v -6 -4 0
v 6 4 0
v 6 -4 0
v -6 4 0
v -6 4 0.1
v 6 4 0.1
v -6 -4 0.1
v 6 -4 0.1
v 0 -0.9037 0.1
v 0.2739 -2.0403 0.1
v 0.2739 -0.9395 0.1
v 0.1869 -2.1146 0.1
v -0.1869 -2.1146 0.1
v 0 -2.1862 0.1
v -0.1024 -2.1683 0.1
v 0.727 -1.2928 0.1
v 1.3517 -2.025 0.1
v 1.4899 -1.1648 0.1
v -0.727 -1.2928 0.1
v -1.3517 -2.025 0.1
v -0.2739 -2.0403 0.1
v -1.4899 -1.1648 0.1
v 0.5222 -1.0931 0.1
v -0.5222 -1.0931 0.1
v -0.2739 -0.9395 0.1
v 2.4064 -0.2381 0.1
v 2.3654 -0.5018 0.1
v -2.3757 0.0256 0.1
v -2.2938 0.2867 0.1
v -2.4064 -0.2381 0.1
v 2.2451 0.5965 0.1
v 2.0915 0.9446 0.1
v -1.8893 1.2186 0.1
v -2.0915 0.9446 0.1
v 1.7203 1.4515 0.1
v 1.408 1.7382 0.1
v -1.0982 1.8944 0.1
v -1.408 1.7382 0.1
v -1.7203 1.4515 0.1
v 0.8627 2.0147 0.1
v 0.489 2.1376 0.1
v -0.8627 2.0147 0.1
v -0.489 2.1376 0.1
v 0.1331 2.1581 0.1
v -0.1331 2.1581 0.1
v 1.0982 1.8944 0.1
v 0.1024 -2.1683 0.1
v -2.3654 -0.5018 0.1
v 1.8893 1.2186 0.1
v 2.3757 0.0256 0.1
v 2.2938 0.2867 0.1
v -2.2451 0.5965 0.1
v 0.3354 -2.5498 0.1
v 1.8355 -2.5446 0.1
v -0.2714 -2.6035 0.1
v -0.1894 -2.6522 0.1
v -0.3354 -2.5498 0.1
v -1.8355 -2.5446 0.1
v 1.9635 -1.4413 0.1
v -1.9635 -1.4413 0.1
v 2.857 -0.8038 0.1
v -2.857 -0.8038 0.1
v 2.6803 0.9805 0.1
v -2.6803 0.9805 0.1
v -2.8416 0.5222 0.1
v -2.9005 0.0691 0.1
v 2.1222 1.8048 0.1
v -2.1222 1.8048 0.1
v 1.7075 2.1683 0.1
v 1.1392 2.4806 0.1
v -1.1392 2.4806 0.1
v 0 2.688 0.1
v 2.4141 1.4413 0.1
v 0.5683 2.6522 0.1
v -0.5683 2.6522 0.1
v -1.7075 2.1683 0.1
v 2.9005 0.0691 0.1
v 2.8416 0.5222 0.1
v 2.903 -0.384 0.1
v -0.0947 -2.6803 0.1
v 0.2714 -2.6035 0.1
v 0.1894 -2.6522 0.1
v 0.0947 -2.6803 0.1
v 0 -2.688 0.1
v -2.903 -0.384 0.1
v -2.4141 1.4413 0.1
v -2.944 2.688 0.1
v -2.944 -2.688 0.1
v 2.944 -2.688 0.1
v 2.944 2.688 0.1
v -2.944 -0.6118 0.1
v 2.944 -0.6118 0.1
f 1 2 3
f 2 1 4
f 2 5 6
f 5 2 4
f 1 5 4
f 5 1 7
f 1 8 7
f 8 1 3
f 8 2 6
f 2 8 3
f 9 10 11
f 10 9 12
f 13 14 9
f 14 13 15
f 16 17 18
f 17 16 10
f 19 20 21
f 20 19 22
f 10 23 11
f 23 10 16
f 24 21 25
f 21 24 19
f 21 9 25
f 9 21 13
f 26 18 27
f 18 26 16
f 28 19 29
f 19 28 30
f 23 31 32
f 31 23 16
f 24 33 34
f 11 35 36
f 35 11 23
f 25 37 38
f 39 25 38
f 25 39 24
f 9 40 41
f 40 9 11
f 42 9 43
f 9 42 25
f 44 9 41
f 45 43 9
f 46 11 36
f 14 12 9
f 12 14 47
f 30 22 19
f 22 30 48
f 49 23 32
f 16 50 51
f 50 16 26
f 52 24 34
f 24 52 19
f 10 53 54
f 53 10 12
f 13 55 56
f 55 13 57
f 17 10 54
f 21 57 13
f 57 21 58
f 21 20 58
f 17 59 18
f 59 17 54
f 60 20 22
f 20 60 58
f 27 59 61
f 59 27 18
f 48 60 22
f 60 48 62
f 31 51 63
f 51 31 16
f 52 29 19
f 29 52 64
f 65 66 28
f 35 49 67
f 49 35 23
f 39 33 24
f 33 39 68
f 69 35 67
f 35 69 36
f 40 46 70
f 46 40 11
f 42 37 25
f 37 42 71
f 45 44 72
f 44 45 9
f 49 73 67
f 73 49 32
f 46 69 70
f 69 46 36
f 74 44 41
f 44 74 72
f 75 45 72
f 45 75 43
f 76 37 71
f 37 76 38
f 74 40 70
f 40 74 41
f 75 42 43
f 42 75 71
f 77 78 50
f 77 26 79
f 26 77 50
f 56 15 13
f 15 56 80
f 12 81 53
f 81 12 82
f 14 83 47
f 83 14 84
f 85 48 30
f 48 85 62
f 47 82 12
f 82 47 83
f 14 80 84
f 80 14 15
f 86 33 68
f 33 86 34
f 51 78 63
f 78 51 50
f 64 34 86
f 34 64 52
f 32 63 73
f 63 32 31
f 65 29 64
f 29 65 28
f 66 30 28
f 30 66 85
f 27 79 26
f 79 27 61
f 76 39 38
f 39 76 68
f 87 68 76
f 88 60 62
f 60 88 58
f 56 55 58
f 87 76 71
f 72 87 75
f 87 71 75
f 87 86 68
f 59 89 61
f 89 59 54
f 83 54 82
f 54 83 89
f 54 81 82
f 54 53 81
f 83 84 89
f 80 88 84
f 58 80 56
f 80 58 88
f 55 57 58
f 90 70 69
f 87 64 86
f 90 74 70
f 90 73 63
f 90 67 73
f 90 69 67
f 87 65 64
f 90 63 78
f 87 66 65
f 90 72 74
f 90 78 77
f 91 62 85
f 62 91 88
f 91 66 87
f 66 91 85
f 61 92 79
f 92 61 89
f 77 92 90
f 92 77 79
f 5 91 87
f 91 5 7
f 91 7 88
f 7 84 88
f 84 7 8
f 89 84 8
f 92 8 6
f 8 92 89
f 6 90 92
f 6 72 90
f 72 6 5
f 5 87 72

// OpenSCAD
// file: ../p/logo-shell-1971-outerbox.scad
use <../lib.scad>
function ldraw_lib__logo_shell_1971_outerbox() = [
// 0 Logo Shell 1971 Outerbox
// 0 Name: logo-shell-1971-outerbox.dat
// 0 Author: Vincent Messenet [Cheenzo]
// 0 !LDRAW_ORG Primitive UPDATE 2023-04
// 0 !LICENSE Licensed under CC BY 4.0 : see CAreadme.txt
// 
// 0 BFC CERTIFY CCW
  [0,"BFC","CERTIFY"],
  [0,"BFC","CCW"],
// 
// 0 !HISTORY 2023-06-28 [Cheenzo] Created based on 3004s60 by J. C. Tchang [tchang]
// 0 !HISTORY 2023-08-25 [OrionP] Official Update 2023-04
// 
// 
// 0 // Shell Logo 1971
// 0 // Size: x = -11.5 to 11.5 y = -10.5 to 10.5 z = 0
// 
// 3 16 -11.5 0 10.5 -8.29 0 7.05 -6.67 0 8.47
  [3,16,-11.5,0,10.5,-8.29,0,7.05,-6.67,0,8.47],
// 4 16 -7.17 0 -9.94 -7.67 0 -5.63 -11.16 0 -3.14 -11.5 0 -10.5
  [4,16,-7.17,0,-9.94,-7.67,0,-5.63,-11.16,0,-3.14,-11.5,0,-10.5],
// 3 16 -.74 0 -10.36 -1.06 0 -10.17 -7.17 0 -9.94
  [3,16,-.74,0,-10.36,-1.06,0,-10.17,-7.17,0,-9.94],
// 3 16 -11.5 0 10.5 -6.67 0 8.47 -4.45 0 9.69
  [3,16,-11.5,0,10.5,-6.67,0,8.47,-4.45,0,9.69],
// 3 16 0 0 10.5 -11.5 0 10.5 -2.22 0 10.36
  [3,16,0,0,10.5,-11.5,0,10.5,-2.22,0,10.36],
// 3 16 -11.5 0 10.5 -4.45 0 9.69 -2.22 0 10.36
  [3,16,-11.5,0,10.5,-4.45,0,9.69,-2.22,0,10.36],
// 3 16 -11.5 0 10.5 -9.43 0 5.63 -8.29 0 7.05
  [3,16,-11.5,0,10.5,-9.43,0,5.63,-8.29,0,7.05],
// 4 16 11.16 0 -3.14 7.67 0 -5.63 7.17 0 -9.94 11.5 0 -10.5
  [4,16,11.16,0,-3.14,7.67,0,-5.63,7.17,0,-9.94,11.5,0,-10.5],
// 4 16 11.5 0 -10.5 7.17 0 -9.94 .74 0 -10.36 .37 0 -10.47
  [4,16,11.5,0,-10.5,7.17,0,-9.94,.74,0,-10.36,.37,0,-10.47],
// 3 16 7.17 0 -9.94 1.06 0 -10.17 .74 0 -10.36
  [3,16,7.17,0,-9.94,1.06,0,-10.17,.74,0,-10.36],
// 3 16 7.17 0 -9.94 1.31 0 -9.96 1.06 0 -10.17
  [3,16,7.17,0,-9.94,1.31,0,-9.96,1.06,0,-10.17],
// 3 16 .37 0 -10.47 0 0 -10.5 11.5 0 -10.5
  [3,16,.37,0,-10.47,0,0,-10.5,11.5,0,-10.5],
// 3 16 -.37 0 -10.47 -11.5 0 -10.5 0 0 -10.5
  [3,16,-.37,0,-10.47,-11.5,0,-10.5,0,0,-10.5],
// 4 16 -.37 0 -10.47 -.74 0 -10.36 -7.17 0 -9.94 -11.5 0 -10.5
  [4,16,-.37,0,-10.47,-.74,0,-10.36,-7.17,0,-9.94,-11.5,0,-10.5],
// 3 16 -1.06 0 -10.17 -1.31 0 -9.96 -7.17 0 -9.94
  [3,16,-1.06,0,-10.17,-1.31,0,-9.96,-7.17,0,-9.94],
// 3 16 11.5 0 10.5 4.45 0 9.69 6.67 0 8.47
  [3,16,11.5,0,10.5,4.45,0,9.69,6.67,0,8.47],
// 3 16 -11.5 0 10.5 -10.47 0 3.83 -9.43 0 5.63
  [3,16,-11.5,0,10.5,-10.47,0,3.83,-9.43,0,5.63],
// 3 16 11.5 0 10.5 2.22 0 10.36 4.45 0 9.69
  [3,16,11.5,0,10.5,2.22,0,10.36,4.45,0,9.69],
// 3 16 11.5 0 10.5 9.43 0 5.63 10.47 0 3.83
  [3,16,11.5,0,10.5,9.43,0,5.63,10.47,0,3.83],
// 3 16 11.5 0 10.5 8.29 0 7.05 9.43 0 5.63
  [3,16,11.5,0,10.5,8.29,0,7.05,9.43,0,5.63],
// 3 16 11.5 0 10.5 6.67 0 8.47 8.29 0 7.05
  [3,16,11.5,0,10.5,6.67,0,8.47,8.29,0,7.05],
// 3 16 -11.5 0 10.5 -11.1 0 2.04 -10.47 0 3.83
  [3,16,-11.5,0,10.5,-11.1,0,2.04,-10.47,0,3.83],
// 3 16 11.5 0 10.5 10.47 0 3.83 11.1 0 2.04
  [3,16,11.5,0,10.5,10.47,0,3.83,11.1,0,2.04],
// 3 16 -11.5 0 10.5 -11.33 0 .27 -11.1 0 2.04
  [3,16,-11.5,0,10.5,-11.33,0,.27,-11.1,0,2.04],
// 3 16 11.5 0 10.5 0 0 10.5 2.22 0 10.36
  [3,16,11.5,0,10.5,0,0,10.5,2.22,0,10.36],
// 3 16 11.5 0 10.5 11.1 0 2.04 11.33 0 .27
  [3,16,11.5,0,10.5,11.1,0,2.04,11.33,0,.27],
// 4 16 -11.16 0 -3.14 -11.34 0 -1.5 -11.5 0 -2.39 -11.5 0 -10.5
  [4,16,-11.16,0,-3.14,-11.34,0,-1.5,-11.5,0,-2.39,-11.5,0,-10.5],
// 4 16 -11.34 0 -1.5 -11.33 0 .27 -11.5 0 10.5 -11.5 0 -2.39
  [4,16,-11.34,0,-1.5,-11.33,0,.27,-11.5,0,10.5,-11.5,0,-2.39],
// 4 16 11.5 0 -2.39 11.34 0 -1.5 11.16 0 -3.14 11.5 0 -10.5
  [4,16,11.5,0,-2.39,11.34,0,-1.5,11.16,0,-3.14,11.5,0,-10.5],
// 4 16 11.5 0 -2.39 11.5 0 10.5 11.33 0 .27 11.34 0 -1.5
  [4,16,11.5,0,-2.39,11.5,0,10.5,11.33,0,.27,11.34,0,-1.5],
];
module ldraw_lib__logo_shell_1971_outerbox(step=0, col=false, unit=2/5, alt=false, line=0.2, solid=!$preview)
    makepoly(ldraw_lib__logo_shell_1971_outerbox(), step=step, col=col, unit=unit, alt=alt, line=line, solid=solid);
ldraw_lib__logo_shell_1971_outerbox(line=0.2);
// file: ../p/box5-12.scad
use <../lib.scad>
function ldraw_lib__box5_12() = [
// 0 Box with 5 Faces without Any Edges
// 0 Name: box5-12.dat
// 0 Author: Chris Dee [cwdee]
// 0 !LDRAW_ORG Primitive UPDATE 2009-02
// 0 !LICENSE Licensed under CC BY 4.0 : see CAreadme.txt
// 
// 0 BFC CERTIFY CCW
  [0,"BFC","CERTIFY"],
  [0,"BFC","CCW"],
// 
// 0 !HISTORY 2009-09-03 [PTadmin] Official Update 2009-02
// 
// 
// 4 16 1 1 1 1 1 -1 -1 1 -1 -1 1 1
  [4,16,1,1,1,1,1,-1,-1,1,-1,-1,1,1],
// 4 16 -1 0 1 1 0 1 1 1 1 -1 1 1
  [4,16,-1,0,1,1,0,1,1,1,1,-1,1,1],
// 4 16 -1 0 -1 -1 0 1 -1 1 1 -1 1 -1
  [4,16,-1,0,-1,-1,0,1,-1,1,1,-1,1,-1],
// 4 16 1 0 -1 -1 0 -1 -1 1 -1 1 1 -1
  [4,16,1,0,-1,-1,0,-1,-1,1,-1,1,1,-1],
// 4 16 1 0 1 1 0 -1 1 1 -1 1 1 1
  [4,16,1,0,1,1,0,-1,1,1,-1,1,1,1],
// 0
];
module ldraw_lib__box5_12(step=0, col=false, unit=2/5, alt=false, line=0.2, solid=!$preview)
    makepoly(ldraw_lib__box5_12(), step=step, col=col, unit=unit, alt=alt, line=line, solid=solid);
ldraw_lib__box5_12(line=0.2);
// file: 004695a.scad
use <../lib.scad>
use <../p/box5-12.scad>
use <../p/logo-shell-1971-outerbox.scad>
use <../p/logo-shell-1971.scad>
function ldraw_lib__004695a() = [
// 0 Sticker  1.0 x  1.5 with Shell Logo 1971
// 0 Name: 004695a.dat
// 0 Author: J.C. Tchang [tchang]
// 0 !LDRAW_ORG Part UPDATE 2023-04
// 0 !LICENSE Licensed under CC BY 4.0 : see CAreadme.txt
// 
// 0 BFC CERTIFY CCW
  [0,"BFC","CERTIFY"],
  [0,"BFC","CCW"],
// 
// 0 !KEYWORDS Bricklink 377.1stk01, Brickowl 327282, Rebrickable 4695, Set 377
// 
// 0 !HISTORY 2014-06-21 [PTadmin] Official Update 2014-01
// 0 !HISTORY 2023-06-30 [Cheenzo] Made use of logo prims, added keyword, updated description
// 0 !HISTORY 2023-08-25 [OrionP] Official Update 2023-04
// 
// 
// 1 16 0 -0.25 0 15 0 0 0 0.25 0 0 0 10 box5-12.dat
  [1,16,0,-0.25,0,15,0,0,0,0.25,0,0,0,10, ldraw_lib__box5_12()],
// 1 16 0 -.25 0 .64 0 0 0 1 0 0 0 .64 logo-shell-1971.dat
  [1,16,0,-.25,0,.64,0,0,0,1,0,0,0,.64, ldraw_lib__logo_shell_1971()],
// 1 15 0 -0.25 0 0.64 0 0 0 1 0 0 0 0.64 logo-shell-1971-outerbox.dat
  [1,15,0,-0.25,0,0.64,0,0,0,1,0,0,0,0.64, ldraw_lib__logo_shell_1971_outerbox()],
// 4 15 -7.36 -.25 -1.5296 -7.36 -.25 6.72 -15 -.25 10 -15 -.25 -10
  [4,15,-7.36,-.25,-1.5296,-7.36,-.25,6.72,-15,-.25,10,-15,-.25,-10],
// 3 15 -7.36 -.25 -1.5296 -15 -.25 -10 -7.36 -.25 -6.72
  [3,15,-7.36,-.25,-1.5296,-15,-.25,-10,-7.36,-.25,-6.72],
// 4 15 0 -0.25 -6.72 -7.36 -0.25 -6.72 -15 -0.25 -10 15 -0.25 -10
  [4,15,0,-0.25,-6.72,-7.36,-0.25,-6.72,-15,-0.25,-10,15,-0.25,-10],
// 3 15 7.36 -0.25 -6.72 0 -0.25 -6.72 15 -0.25 -10
  [3,15,7.36,-0.25,-6.72,0,-0.25,-6.72,15,-0.25,-10],
// 4 15 7.36 -.25 -1.5296 7.36 -.25 -6.72 15 -.25 -10 15 -.25 10
  [4,15,7.36,-.25,-1.5296,7.36,-.25,-6.72,15,-.25,-10,15,-.25,10],
// 3 15 15 -.25 10 7.36 -.25 6.72 7.36 -.25 -1.5296
  [3,15,15,-.25,10,7.36,-.25,6.72,7.36,-.25,-1.5296],
// 4 15 0 -0.25 6.72 7.36 -0.25 6.72 15 -0.25 10 -15 -0.25 10
  [4,15,0,-0.25,6.72,7.36,-0.25,6.72,15,-0.25,10,-15,-0.25,10],
// 3 15 -15 -0.25 10 -7.36 -0.25 6.72 0 -0.25 6.72
  [3,15,-15,-0.25,10,-7.36,-0.25,6.72,0,-0.25,6.72],
];
module ldraw_lib__004695a(step=0, col=false, unit=2/5, alt=false, line=0.2, solid=!$preview)
    makepoly(ldraw_lib__004695a(), step=step, col=col, unit=unit, alt=alt, line=line, solid=solid);
ldraw_lib__004695a(line=0.2);
// main file
use <../lib.scad>
use <004695a.scad>
function ldraw_lib__004655a() = [
// 0 =Sticker 1.0 x 1.5 with Shell Logo
// 0 Name: 004655a.dat
// 0 Author: Takeshi Takahashi [RainbowDolphin]
// 0 !LDRAW_ORG Part Alias UPDATE 2024-05
// 0 !LICENSE Licensed under CC BY 4.0 : see CAreadme.txt
// 
// 0 BFC CERTIFY CCW
  [0,"BFC","CERTIFY"],
  [0,"BFC","CCW"],
// 
// 0 !KEYWORDS Gas pump, set 601
// 
// 0 !HISTORY 2024-06-30 [OrionP] Official Update 2024-05
// 
// 
// 0 // Alias of 004695a
// 1 16 0 0 0 1 0 0 0 1 0 0 0 1 004695a.dat
  [1,16,0,0,0,1,0,0,0,1,0,0,0,1, ldraw_lib__004695a()],
];
module ldraw_lib__004655a(step=0, col=false, unit=2/5, alt=false, line=0.2, solid=!$preview)
    makepoly(ldraw_lib__004655a(), step=step, col=col, unit=unit, alt=alt, line=line, solid=solid);
ldraw_lib__004655a(line=0.2);
